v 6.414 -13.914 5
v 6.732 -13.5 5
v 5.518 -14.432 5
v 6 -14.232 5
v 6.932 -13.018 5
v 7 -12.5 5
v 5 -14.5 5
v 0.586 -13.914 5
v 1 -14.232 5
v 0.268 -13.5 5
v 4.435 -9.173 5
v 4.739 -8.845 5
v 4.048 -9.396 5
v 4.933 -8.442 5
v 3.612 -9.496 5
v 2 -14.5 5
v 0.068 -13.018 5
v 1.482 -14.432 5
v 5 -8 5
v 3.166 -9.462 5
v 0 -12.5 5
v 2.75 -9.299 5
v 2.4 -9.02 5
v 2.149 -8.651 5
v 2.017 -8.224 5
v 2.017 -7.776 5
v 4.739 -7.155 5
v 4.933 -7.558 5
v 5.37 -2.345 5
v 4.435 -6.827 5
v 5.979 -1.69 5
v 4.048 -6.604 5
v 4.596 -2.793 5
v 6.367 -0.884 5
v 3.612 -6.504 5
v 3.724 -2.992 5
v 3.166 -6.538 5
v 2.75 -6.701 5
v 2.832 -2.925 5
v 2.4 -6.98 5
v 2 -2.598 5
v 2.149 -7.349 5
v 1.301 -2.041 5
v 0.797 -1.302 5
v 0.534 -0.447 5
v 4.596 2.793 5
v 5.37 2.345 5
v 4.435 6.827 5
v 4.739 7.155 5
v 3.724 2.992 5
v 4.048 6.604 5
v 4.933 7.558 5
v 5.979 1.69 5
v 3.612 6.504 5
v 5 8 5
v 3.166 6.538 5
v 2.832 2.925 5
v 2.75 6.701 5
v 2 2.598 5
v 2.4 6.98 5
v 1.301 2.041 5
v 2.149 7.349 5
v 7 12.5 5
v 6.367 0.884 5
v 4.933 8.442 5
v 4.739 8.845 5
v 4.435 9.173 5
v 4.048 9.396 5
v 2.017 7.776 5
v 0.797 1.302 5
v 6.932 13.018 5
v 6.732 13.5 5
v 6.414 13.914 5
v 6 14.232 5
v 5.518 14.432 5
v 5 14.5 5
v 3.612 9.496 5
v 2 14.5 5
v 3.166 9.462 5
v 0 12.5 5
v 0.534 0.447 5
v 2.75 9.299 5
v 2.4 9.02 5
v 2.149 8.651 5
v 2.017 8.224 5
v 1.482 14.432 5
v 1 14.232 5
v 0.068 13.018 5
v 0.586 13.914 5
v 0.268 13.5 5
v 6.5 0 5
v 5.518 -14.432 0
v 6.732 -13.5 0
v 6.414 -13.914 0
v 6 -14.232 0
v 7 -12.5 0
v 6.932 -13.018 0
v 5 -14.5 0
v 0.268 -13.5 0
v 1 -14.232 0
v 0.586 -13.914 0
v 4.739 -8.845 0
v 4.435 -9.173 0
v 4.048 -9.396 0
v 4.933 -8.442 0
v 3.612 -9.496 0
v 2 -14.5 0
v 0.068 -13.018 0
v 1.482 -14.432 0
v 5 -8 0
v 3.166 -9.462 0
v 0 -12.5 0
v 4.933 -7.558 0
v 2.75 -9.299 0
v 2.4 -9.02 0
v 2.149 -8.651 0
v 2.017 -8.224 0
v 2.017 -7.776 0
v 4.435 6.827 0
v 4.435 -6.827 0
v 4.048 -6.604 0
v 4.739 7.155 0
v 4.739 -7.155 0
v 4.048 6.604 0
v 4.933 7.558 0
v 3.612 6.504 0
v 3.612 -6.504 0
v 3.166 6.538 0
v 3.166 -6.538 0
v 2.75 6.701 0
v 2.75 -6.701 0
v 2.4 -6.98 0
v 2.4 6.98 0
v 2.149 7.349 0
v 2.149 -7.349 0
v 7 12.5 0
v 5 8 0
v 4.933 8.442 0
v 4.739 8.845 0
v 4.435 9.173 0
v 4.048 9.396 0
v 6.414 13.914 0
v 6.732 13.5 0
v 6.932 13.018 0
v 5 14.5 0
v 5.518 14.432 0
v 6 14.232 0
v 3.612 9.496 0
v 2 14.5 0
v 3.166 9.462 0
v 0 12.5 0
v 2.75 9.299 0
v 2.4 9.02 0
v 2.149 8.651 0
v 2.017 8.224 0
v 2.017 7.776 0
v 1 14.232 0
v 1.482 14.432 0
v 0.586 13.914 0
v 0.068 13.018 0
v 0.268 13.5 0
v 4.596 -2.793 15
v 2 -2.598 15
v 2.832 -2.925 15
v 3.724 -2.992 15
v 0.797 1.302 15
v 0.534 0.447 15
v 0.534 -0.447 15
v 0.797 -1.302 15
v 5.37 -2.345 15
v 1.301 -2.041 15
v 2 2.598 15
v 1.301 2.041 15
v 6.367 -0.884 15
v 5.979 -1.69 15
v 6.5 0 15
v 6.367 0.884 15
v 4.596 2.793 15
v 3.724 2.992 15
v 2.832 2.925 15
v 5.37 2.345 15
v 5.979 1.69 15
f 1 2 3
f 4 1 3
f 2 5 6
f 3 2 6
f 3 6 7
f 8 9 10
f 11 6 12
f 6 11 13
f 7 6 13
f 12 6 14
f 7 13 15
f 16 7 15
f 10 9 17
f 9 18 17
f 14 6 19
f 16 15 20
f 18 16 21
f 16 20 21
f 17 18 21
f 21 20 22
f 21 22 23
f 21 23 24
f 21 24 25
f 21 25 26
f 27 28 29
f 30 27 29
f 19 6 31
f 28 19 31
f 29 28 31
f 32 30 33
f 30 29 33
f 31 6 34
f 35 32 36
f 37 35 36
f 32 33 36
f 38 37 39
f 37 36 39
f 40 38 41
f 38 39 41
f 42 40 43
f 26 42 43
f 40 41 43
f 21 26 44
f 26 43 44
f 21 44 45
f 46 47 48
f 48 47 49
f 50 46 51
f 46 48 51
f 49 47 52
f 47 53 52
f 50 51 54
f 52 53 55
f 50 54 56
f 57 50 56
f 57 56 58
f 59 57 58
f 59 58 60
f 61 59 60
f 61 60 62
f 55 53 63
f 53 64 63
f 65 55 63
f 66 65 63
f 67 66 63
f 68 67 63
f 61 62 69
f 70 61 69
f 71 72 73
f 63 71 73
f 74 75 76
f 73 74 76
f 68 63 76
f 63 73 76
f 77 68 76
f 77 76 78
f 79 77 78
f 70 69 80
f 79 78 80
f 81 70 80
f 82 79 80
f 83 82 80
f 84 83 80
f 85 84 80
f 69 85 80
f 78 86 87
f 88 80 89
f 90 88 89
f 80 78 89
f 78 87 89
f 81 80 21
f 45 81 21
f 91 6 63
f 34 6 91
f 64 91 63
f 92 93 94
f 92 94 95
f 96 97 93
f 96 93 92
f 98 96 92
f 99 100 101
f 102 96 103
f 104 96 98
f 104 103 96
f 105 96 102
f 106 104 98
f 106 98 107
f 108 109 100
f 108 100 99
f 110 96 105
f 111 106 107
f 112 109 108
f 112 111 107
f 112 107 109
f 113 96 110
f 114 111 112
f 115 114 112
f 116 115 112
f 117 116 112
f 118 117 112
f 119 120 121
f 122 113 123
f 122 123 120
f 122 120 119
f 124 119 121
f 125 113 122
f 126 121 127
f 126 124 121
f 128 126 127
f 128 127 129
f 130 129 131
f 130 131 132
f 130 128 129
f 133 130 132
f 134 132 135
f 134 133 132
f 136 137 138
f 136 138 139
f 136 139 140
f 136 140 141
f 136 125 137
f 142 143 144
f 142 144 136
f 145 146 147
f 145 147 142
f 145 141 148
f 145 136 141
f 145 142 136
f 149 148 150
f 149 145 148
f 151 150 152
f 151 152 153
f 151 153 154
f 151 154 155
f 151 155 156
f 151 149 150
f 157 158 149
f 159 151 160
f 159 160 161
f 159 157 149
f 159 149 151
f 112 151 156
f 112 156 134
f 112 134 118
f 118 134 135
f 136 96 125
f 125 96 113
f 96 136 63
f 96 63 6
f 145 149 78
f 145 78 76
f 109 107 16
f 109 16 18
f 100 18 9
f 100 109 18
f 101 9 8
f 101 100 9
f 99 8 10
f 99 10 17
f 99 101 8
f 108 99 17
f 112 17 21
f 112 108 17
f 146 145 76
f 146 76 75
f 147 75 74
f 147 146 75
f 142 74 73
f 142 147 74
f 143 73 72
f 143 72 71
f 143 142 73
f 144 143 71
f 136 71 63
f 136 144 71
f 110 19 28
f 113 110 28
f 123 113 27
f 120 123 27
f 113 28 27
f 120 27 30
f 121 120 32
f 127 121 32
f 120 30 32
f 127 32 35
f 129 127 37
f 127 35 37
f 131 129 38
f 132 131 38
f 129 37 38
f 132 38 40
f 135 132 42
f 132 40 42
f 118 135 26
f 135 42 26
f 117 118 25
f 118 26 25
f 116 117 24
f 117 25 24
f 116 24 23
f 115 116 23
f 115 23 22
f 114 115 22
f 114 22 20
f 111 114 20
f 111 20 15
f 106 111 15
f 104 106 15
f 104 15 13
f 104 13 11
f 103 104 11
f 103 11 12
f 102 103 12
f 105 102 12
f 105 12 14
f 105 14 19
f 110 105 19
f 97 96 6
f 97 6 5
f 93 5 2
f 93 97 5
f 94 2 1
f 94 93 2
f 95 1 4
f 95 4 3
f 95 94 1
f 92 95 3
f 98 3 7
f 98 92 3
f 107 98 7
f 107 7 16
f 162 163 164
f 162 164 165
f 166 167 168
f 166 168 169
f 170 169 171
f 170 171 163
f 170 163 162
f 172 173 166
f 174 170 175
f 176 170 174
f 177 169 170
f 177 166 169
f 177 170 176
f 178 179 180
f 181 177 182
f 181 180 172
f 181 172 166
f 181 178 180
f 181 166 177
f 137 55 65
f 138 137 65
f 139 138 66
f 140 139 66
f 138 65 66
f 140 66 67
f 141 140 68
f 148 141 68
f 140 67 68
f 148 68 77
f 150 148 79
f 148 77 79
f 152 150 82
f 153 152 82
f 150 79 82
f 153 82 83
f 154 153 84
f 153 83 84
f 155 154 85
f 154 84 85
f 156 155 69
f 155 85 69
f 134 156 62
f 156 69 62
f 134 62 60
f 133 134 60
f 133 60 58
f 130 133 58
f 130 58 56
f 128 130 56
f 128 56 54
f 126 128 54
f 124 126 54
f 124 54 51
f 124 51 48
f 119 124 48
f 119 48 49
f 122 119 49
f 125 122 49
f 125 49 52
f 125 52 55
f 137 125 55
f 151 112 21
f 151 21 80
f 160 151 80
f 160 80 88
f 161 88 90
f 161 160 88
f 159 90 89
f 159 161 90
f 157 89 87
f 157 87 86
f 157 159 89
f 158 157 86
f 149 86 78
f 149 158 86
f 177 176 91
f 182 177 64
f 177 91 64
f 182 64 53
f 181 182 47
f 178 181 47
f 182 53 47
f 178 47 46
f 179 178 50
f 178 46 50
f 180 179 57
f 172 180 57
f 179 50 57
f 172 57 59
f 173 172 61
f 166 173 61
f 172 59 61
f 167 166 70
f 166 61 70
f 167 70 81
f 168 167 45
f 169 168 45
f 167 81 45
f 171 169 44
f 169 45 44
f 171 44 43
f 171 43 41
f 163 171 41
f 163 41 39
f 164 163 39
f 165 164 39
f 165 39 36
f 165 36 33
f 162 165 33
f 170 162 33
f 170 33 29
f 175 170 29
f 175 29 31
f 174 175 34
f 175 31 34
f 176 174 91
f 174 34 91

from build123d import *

# Parameters (mm, degrees)
BOSS_EXTRUDE1_DEPTH = 5
SKETCH2_R           = 3
BOSS_EXTRUDE2_DEPTH = 10
SKETCH3_R           = 1.5
CUT_EXTRUDE1_DEPTH  = 19.953891421


with BuildPart() as part:
    # Sketch1 → Boss-Extrude1 (new body)
    with BuildSketch(Plane.XY):
        with BuildLine():
            Line((0, -12.5), (0, 12.5))
            ThreePointArc((0, 12.5), (0.585786438, 13.914213562), (2, 14.5))
            Line((2, 14.5), (5, 14.5))
            ThreePointArc((5, 14.5), (6.414213562, 13.914213562), (7, 12.5))
            Line((7, 12.5), (7, -12.5))
            ThreePointArc((7, -12.5), (6.414213562, -13.914213562), (5, -14.5))
            Line((5, -14.5), (2, -14.5))
            ThreePointArc((2, -14.5), (0.585786438, -13.914213562), (0, -12.5))
        make_face()
    extrude(amount=BOSS_EXTRUDE1_DEPTH)

    # Sketch2 → Boss-Extrude2 (add)
    with BuildSketch(Plane.XY.offset(5)):
        with Locations((3.5, 0)):
            Circle(SKETCH2_R)
    extrude(amount=BOSS_EXTRUDE2_DEPTH)

    # Sketch3 → Cut-Extrude1 (cut, through all)
    with BuildSketch(Plane.XY.offset(5)):
        with Locations((3.5, 8)):
            Circle(SKETCH3_R)
        with Locations((3.5, -8)):
            Circle(SKETCH3_R)
    extrude(amount=-CUT_EXTRUDE1_DEPTH, mode=Mode.SUBTRACT)


solid = part.part
